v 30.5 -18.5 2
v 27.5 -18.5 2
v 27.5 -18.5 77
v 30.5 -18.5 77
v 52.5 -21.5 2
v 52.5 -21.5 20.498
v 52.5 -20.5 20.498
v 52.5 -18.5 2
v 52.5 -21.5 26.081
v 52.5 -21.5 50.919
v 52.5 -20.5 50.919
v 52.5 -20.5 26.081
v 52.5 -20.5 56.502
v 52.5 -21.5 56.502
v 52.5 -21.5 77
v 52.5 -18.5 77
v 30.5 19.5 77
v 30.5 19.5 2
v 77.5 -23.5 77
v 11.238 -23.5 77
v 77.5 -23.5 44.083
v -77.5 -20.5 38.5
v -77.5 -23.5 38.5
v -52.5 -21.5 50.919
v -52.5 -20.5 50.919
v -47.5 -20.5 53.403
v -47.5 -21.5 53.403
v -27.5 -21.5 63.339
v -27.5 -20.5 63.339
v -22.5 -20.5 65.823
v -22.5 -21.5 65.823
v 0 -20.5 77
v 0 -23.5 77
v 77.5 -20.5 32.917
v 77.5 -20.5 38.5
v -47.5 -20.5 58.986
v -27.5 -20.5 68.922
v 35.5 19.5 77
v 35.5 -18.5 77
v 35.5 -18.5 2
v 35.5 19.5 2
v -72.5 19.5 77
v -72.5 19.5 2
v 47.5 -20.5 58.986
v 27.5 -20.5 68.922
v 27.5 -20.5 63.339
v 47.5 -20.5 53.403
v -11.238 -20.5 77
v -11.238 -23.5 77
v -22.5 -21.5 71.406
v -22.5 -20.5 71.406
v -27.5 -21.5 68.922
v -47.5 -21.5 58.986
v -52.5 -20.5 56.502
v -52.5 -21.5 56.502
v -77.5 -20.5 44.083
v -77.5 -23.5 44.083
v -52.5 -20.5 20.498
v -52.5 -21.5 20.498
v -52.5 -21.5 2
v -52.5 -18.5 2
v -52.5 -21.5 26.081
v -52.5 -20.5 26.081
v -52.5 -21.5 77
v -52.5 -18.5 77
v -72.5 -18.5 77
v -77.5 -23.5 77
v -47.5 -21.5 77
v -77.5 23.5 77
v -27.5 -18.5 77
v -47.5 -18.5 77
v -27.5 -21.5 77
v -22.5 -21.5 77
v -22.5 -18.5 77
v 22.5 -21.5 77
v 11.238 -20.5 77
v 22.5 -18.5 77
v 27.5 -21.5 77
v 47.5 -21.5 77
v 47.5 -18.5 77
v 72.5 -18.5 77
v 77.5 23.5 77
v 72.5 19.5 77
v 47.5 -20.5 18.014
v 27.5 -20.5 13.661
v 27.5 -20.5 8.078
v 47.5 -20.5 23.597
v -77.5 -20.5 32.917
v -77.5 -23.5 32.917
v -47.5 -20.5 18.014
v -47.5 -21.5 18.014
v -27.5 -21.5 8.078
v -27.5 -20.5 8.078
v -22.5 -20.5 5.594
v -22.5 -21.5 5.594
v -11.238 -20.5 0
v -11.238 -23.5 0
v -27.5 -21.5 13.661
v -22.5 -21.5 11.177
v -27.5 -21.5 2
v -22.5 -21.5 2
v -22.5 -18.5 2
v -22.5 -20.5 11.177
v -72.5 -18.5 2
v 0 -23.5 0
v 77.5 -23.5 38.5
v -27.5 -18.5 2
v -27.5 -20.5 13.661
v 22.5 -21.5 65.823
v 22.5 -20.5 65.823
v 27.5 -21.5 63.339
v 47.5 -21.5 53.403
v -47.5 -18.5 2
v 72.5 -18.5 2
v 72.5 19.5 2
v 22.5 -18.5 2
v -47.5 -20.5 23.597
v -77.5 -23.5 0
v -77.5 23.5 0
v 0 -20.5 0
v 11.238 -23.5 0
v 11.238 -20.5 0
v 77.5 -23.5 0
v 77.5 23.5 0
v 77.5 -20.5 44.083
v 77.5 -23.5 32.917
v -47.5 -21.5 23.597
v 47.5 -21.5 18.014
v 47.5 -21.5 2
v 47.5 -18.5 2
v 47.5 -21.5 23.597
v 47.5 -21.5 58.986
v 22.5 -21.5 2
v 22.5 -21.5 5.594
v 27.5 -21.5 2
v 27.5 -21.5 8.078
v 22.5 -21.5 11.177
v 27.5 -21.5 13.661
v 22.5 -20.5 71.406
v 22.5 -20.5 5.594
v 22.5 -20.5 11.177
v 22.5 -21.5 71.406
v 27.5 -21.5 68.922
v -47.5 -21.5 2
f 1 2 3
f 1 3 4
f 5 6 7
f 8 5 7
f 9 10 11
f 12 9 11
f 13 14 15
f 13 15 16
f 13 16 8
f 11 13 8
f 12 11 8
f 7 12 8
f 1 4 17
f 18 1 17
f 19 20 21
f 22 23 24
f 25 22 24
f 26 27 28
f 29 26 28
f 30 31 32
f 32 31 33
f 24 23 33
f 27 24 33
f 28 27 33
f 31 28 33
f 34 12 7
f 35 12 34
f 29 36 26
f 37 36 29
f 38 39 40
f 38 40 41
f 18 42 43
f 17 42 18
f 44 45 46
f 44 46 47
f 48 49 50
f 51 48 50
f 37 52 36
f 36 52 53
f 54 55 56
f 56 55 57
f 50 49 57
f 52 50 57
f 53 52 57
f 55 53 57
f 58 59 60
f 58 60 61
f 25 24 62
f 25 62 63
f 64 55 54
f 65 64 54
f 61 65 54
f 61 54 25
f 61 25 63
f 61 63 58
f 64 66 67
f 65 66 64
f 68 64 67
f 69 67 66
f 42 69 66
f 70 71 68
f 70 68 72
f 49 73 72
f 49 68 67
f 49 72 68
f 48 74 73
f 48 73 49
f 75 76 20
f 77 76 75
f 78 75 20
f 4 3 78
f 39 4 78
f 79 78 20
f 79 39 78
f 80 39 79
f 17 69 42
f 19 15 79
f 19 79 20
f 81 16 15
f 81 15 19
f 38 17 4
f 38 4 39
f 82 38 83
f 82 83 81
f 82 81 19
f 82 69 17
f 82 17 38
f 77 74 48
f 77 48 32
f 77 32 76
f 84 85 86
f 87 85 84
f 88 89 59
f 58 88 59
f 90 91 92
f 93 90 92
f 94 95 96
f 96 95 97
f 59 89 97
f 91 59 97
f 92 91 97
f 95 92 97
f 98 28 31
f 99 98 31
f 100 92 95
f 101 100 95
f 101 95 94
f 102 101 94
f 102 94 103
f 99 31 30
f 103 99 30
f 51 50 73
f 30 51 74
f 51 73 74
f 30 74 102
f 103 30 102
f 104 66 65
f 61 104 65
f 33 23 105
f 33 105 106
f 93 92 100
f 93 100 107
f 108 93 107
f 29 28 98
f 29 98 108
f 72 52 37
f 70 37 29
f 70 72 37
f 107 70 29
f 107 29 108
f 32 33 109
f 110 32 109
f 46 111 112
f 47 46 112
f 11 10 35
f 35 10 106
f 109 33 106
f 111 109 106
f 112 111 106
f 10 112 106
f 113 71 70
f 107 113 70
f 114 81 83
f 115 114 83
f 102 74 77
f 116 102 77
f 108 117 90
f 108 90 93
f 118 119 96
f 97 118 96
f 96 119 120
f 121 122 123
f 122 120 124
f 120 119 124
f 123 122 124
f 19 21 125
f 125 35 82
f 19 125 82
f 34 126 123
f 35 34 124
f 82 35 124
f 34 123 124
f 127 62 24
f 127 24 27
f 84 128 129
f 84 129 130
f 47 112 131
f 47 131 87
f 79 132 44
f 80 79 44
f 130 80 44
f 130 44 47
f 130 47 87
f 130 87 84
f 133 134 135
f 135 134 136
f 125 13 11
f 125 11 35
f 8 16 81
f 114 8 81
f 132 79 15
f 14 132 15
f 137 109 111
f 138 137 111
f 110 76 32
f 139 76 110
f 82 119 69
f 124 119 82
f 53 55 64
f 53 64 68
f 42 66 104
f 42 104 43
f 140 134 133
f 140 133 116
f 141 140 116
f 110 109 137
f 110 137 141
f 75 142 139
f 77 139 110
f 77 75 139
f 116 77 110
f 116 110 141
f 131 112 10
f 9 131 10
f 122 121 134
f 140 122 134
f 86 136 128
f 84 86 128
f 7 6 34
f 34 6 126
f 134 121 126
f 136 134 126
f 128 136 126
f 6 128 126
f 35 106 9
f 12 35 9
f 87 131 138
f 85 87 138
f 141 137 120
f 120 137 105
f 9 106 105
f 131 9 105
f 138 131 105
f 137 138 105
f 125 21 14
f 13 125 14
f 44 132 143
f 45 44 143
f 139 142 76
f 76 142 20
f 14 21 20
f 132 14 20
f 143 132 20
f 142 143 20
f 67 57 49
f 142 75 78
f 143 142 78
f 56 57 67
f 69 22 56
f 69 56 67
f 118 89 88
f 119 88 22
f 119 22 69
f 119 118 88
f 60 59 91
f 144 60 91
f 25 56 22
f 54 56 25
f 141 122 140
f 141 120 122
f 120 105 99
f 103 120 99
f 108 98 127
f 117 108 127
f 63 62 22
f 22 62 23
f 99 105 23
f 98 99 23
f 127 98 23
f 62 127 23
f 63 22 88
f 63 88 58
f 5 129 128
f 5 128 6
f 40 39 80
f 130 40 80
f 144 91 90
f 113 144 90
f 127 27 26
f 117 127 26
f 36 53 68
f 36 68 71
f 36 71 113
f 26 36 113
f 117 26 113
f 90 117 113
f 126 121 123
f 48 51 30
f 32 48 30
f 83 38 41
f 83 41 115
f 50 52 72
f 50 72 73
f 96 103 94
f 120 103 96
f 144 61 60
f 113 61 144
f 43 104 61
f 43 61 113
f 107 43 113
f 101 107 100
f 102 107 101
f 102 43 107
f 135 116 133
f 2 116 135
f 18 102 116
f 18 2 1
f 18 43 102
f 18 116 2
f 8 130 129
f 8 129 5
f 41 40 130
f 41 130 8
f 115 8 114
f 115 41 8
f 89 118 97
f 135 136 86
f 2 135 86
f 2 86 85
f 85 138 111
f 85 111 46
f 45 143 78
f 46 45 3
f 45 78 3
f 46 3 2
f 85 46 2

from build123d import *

# Parameters (mm, degrees)
F0_W     = 155
F0_H     = 47
F1_DEPTH = 77
F2_W     = 103
F2_H     = 38
F2_W_2   = 37
F3_DEPTH = 75
F5_DEPTH = 3
F6_W     = 5
F6_H     = 3
F7_DEPTH = 75


with BuildPart() as f1:
    # F0 (on Top) → F1 (new body)
    with BuildSketch(Plane.XY):
        Rectangle(F0_W, F0_H)
    extrude(amount=F1_DEPTH)

    # F2 (on face) → F3 (cut)
    with BuildSketch(Plane.XY.offset(77)):
        with Locations((-21, 0.5)):
            Rectangle(F2_W, F2_H)
        with Locations((54, 0.5)):
            Rectangle(F2_W_2, F2_H)
    extrude(amount=-F3_DEPTH, mode=Mode.SUBTRACT)

    # F4 (on face) → F5 (cut)
    with BuildSketch(Plane.XZ.offset(23.5)):
        Polygon((-77.5, 38.5), (0, 77), (-11.2384570943, 77), (-77.5, 44.0829754598), align=None)
        Polygon((0, 0), (-77.5, 38.5), (-77.5, 32.9170245402), (-11.2384570943, 0), align=None)
        Polygon((77.5, 32.9170245402), (77.5, 38.5), (0, 0), (11.2384570943, 0), align=None)
        Polygon((11.2384570943, 77), (0, 77), (77.5, 38.5), (77.5, 44.0829754598), align=None)
    extrude(amount=-F5_DEPTH, mode=Mode.SUBTRACT)

    # F6 (on face) → F7 (cut)
    with BuildSketch(Plane.XY.offset(77)):
        with Locations((50, -20)):
            Rectangle(F6_W, F6_H)
        with Locations((25, -20)):
            Rectangle(F6_W, F6_H)
        with Locations((-25, -20)):
            Rectangle(F6_W, F6_H)
        with Locations((-50, -20)):
            Rectangle(F6_W, F6_H)
    extrude(amount=-F7_DEPTH, mode=Mode.SUBTRACT)


solid = f1.part
